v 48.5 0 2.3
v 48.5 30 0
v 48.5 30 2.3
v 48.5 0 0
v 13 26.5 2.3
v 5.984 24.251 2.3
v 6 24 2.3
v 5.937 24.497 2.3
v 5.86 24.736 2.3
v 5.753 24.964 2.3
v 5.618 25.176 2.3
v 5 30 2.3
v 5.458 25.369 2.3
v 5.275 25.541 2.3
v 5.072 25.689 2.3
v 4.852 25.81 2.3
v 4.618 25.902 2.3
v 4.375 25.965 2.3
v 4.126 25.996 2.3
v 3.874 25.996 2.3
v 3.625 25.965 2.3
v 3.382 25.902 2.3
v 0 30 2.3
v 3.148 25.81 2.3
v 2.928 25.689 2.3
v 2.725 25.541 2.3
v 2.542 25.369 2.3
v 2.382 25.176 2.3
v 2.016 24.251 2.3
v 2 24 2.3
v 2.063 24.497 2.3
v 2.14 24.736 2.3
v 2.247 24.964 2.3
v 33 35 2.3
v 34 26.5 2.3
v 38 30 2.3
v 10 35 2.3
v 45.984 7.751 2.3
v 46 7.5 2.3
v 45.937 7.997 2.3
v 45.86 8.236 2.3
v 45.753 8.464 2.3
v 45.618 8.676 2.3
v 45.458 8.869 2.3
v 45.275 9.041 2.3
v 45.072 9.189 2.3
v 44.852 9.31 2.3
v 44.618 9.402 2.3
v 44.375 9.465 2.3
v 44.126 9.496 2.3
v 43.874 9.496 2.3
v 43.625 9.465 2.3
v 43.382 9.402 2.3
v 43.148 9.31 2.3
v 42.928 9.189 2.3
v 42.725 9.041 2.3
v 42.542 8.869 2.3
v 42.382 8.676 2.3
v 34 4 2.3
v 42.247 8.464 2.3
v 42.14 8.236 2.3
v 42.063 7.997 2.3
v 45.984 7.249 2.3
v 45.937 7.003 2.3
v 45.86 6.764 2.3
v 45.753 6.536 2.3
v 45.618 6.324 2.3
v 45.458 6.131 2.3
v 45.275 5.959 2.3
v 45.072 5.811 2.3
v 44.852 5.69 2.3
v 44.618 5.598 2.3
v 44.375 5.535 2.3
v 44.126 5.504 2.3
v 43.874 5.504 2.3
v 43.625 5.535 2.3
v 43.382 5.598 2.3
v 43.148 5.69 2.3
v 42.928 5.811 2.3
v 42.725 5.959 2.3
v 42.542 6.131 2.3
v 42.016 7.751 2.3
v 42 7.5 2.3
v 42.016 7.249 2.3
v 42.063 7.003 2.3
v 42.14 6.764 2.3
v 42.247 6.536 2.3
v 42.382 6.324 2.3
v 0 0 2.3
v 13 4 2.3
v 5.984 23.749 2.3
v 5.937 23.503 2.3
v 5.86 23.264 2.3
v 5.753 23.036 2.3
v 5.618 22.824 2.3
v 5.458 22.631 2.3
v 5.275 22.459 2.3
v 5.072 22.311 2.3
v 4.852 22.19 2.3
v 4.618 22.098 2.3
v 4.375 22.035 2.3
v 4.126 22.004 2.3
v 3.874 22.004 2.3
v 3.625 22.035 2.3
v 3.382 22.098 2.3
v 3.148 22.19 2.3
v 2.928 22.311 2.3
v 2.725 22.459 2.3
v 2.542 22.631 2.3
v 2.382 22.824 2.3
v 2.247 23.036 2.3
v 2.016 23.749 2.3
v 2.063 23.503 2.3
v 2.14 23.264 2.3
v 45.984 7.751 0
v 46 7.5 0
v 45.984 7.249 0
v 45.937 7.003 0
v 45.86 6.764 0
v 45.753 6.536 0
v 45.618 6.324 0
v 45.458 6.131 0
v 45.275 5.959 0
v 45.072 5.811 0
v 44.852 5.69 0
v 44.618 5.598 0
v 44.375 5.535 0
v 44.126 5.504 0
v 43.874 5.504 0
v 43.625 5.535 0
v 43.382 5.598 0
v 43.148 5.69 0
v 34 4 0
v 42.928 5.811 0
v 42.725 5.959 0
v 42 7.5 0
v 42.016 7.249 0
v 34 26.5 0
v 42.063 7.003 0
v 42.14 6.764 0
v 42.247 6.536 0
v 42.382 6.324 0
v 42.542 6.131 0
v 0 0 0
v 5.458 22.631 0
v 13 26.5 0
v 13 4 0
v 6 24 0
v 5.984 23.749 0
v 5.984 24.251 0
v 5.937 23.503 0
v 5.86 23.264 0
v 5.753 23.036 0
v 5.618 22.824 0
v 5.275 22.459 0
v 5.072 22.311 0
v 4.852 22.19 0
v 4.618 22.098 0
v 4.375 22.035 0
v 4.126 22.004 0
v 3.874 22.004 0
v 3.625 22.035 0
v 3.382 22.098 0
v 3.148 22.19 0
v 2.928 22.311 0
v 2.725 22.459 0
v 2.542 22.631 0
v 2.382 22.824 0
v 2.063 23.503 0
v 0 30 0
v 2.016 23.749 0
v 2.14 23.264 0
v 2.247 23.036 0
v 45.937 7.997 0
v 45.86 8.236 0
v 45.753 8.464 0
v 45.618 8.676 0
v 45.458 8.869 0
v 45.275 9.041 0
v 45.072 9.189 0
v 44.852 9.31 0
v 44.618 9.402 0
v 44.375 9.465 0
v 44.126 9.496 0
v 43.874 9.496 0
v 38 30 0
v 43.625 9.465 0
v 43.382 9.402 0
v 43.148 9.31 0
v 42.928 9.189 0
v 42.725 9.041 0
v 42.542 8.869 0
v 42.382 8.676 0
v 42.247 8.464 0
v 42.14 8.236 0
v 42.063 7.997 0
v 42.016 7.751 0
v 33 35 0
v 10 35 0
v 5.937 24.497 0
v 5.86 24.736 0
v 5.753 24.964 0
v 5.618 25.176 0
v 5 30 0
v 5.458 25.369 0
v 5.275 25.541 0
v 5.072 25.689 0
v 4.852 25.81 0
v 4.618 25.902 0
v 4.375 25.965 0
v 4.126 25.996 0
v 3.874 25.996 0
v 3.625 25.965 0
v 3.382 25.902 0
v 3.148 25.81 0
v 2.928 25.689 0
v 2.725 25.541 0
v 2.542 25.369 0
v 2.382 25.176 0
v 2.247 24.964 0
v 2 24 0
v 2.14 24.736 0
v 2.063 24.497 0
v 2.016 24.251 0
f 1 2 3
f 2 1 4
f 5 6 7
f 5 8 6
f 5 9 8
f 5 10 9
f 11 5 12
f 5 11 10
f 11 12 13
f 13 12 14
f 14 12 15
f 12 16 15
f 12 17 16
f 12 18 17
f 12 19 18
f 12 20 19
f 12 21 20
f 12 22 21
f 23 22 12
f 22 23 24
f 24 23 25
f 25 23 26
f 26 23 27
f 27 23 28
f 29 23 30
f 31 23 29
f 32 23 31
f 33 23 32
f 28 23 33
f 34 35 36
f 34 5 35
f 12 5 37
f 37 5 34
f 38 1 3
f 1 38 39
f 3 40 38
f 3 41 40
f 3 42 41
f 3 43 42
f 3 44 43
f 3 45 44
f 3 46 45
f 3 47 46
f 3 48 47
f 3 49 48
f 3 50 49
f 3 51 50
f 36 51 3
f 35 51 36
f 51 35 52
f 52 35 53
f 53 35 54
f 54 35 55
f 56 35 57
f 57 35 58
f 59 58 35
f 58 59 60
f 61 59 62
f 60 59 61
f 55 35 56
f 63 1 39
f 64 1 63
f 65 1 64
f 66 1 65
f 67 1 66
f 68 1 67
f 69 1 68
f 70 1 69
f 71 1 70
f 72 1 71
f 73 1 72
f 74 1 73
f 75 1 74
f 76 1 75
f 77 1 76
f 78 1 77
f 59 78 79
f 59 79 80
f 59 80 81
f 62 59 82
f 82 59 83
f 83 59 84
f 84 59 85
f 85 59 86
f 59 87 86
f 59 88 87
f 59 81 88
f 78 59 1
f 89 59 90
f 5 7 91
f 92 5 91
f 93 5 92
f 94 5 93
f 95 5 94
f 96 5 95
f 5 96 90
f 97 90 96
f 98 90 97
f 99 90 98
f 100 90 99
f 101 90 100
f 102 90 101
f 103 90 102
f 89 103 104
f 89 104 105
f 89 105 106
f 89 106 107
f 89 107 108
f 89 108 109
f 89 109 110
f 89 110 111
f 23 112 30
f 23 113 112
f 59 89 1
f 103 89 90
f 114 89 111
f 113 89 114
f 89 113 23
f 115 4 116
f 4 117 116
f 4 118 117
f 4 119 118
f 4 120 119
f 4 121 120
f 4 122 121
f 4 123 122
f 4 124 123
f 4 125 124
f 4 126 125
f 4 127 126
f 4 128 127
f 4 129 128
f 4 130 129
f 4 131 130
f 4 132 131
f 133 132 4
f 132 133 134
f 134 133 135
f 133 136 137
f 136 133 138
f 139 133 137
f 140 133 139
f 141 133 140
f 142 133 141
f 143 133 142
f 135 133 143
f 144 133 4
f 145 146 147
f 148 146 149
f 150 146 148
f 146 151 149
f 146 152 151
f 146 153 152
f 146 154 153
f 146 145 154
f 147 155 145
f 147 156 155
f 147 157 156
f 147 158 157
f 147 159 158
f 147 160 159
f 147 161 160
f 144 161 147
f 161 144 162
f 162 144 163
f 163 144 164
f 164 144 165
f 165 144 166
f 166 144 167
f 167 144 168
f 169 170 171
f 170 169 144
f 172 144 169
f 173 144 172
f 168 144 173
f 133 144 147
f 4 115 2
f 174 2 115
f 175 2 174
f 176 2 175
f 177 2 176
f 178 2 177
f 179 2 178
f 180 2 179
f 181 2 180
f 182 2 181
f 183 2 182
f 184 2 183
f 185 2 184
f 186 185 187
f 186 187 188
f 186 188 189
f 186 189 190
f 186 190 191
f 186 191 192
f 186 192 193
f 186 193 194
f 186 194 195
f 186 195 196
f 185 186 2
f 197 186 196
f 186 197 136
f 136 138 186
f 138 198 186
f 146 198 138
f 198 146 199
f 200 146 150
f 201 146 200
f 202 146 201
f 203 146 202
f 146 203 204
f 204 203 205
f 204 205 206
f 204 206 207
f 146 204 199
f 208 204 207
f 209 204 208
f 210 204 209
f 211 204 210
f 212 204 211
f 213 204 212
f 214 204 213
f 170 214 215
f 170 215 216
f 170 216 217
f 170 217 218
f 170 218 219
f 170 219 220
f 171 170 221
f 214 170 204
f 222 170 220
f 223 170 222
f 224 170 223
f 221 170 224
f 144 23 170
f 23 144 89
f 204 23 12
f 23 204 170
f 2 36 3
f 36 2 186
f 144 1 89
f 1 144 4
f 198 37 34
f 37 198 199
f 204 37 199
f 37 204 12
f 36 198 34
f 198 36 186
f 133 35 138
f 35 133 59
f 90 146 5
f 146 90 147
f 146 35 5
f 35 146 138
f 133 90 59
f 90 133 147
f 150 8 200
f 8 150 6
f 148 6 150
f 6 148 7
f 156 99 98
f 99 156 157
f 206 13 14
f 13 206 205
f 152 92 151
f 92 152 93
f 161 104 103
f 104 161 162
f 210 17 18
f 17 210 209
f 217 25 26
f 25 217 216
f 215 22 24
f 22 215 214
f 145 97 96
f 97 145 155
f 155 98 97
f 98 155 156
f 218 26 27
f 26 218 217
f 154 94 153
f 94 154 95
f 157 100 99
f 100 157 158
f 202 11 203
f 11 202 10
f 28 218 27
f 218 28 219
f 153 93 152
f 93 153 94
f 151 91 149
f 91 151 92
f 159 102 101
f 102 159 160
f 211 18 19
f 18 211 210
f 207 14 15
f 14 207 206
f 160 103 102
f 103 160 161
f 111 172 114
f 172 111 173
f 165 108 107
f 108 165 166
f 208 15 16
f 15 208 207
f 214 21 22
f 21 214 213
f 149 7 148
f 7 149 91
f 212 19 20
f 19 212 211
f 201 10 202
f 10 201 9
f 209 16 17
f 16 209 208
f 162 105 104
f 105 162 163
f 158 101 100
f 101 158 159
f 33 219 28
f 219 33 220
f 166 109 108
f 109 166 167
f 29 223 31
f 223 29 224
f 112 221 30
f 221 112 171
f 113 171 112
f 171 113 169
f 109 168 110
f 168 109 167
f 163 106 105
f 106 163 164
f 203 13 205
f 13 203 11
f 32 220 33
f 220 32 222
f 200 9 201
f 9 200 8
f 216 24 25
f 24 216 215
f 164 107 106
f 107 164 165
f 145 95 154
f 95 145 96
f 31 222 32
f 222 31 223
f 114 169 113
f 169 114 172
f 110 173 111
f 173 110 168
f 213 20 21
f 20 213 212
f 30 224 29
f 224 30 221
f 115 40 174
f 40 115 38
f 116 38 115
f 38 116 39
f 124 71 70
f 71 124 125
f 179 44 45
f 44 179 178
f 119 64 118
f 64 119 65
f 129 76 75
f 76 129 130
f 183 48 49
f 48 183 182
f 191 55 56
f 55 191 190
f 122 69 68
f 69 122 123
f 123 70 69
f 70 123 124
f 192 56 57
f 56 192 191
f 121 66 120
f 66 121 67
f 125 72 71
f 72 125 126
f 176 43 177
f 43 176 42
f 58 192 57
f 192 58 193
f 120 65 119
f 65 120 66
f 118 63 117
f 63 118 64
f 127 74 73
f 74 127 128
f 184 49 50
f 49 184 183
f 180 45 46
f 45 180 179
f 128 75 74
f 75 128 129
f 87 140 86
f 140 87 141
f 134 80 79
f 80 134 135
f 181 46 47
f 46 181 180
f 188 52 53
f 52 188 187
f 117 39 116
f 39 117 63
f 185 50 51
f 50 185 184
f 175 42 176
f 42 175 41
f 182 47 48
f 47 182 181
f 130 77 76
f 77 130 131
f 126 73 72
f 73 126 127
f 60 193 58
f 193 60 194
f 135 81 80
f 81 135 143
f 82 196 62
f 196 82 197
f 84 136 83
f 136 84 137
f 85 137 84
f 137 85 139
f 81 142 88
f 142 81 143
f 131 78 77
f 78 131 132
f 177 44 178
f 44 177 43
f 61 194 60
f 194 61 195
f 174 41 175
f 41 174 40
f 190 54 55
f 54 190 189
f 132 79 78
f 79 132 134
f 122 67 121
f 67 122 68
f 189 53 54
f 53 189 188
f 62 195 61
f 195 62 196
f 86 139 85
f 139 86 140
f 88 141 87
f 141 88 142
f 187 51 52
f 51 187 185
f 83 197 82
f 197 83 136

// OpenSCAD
// PLX model.

$fn = 50;
OX = 0.01;

width = 48.5;
height = 30;
weight = 2.3;
hole = 2;

module plx() {
	difference() {
		union() {
			cube([width, height, weight]);
			translate([5, height, 0]) cube([33, 5, weight]);
		}
		// Bevels:
		translate([5, height, -OX]) rotate([0, 0, 45]) cube([10, 10, weight + 2 * OX]);
		translate([38, height, -OX]) rotate([0, 0, 45]) cube([10, 10, weight + 2 * OX]);
		// Holes:
		translate([13, 4, -OX]) cube([21, 22.5, 100]);
		translate([4, height - 6, - OX]) cylinder(r = hole, h = 100);
		translate([width - 4.5, 7.5, - OX]) cylinder(r = hole, h = 100);
	}
}

// Example:
plx();
